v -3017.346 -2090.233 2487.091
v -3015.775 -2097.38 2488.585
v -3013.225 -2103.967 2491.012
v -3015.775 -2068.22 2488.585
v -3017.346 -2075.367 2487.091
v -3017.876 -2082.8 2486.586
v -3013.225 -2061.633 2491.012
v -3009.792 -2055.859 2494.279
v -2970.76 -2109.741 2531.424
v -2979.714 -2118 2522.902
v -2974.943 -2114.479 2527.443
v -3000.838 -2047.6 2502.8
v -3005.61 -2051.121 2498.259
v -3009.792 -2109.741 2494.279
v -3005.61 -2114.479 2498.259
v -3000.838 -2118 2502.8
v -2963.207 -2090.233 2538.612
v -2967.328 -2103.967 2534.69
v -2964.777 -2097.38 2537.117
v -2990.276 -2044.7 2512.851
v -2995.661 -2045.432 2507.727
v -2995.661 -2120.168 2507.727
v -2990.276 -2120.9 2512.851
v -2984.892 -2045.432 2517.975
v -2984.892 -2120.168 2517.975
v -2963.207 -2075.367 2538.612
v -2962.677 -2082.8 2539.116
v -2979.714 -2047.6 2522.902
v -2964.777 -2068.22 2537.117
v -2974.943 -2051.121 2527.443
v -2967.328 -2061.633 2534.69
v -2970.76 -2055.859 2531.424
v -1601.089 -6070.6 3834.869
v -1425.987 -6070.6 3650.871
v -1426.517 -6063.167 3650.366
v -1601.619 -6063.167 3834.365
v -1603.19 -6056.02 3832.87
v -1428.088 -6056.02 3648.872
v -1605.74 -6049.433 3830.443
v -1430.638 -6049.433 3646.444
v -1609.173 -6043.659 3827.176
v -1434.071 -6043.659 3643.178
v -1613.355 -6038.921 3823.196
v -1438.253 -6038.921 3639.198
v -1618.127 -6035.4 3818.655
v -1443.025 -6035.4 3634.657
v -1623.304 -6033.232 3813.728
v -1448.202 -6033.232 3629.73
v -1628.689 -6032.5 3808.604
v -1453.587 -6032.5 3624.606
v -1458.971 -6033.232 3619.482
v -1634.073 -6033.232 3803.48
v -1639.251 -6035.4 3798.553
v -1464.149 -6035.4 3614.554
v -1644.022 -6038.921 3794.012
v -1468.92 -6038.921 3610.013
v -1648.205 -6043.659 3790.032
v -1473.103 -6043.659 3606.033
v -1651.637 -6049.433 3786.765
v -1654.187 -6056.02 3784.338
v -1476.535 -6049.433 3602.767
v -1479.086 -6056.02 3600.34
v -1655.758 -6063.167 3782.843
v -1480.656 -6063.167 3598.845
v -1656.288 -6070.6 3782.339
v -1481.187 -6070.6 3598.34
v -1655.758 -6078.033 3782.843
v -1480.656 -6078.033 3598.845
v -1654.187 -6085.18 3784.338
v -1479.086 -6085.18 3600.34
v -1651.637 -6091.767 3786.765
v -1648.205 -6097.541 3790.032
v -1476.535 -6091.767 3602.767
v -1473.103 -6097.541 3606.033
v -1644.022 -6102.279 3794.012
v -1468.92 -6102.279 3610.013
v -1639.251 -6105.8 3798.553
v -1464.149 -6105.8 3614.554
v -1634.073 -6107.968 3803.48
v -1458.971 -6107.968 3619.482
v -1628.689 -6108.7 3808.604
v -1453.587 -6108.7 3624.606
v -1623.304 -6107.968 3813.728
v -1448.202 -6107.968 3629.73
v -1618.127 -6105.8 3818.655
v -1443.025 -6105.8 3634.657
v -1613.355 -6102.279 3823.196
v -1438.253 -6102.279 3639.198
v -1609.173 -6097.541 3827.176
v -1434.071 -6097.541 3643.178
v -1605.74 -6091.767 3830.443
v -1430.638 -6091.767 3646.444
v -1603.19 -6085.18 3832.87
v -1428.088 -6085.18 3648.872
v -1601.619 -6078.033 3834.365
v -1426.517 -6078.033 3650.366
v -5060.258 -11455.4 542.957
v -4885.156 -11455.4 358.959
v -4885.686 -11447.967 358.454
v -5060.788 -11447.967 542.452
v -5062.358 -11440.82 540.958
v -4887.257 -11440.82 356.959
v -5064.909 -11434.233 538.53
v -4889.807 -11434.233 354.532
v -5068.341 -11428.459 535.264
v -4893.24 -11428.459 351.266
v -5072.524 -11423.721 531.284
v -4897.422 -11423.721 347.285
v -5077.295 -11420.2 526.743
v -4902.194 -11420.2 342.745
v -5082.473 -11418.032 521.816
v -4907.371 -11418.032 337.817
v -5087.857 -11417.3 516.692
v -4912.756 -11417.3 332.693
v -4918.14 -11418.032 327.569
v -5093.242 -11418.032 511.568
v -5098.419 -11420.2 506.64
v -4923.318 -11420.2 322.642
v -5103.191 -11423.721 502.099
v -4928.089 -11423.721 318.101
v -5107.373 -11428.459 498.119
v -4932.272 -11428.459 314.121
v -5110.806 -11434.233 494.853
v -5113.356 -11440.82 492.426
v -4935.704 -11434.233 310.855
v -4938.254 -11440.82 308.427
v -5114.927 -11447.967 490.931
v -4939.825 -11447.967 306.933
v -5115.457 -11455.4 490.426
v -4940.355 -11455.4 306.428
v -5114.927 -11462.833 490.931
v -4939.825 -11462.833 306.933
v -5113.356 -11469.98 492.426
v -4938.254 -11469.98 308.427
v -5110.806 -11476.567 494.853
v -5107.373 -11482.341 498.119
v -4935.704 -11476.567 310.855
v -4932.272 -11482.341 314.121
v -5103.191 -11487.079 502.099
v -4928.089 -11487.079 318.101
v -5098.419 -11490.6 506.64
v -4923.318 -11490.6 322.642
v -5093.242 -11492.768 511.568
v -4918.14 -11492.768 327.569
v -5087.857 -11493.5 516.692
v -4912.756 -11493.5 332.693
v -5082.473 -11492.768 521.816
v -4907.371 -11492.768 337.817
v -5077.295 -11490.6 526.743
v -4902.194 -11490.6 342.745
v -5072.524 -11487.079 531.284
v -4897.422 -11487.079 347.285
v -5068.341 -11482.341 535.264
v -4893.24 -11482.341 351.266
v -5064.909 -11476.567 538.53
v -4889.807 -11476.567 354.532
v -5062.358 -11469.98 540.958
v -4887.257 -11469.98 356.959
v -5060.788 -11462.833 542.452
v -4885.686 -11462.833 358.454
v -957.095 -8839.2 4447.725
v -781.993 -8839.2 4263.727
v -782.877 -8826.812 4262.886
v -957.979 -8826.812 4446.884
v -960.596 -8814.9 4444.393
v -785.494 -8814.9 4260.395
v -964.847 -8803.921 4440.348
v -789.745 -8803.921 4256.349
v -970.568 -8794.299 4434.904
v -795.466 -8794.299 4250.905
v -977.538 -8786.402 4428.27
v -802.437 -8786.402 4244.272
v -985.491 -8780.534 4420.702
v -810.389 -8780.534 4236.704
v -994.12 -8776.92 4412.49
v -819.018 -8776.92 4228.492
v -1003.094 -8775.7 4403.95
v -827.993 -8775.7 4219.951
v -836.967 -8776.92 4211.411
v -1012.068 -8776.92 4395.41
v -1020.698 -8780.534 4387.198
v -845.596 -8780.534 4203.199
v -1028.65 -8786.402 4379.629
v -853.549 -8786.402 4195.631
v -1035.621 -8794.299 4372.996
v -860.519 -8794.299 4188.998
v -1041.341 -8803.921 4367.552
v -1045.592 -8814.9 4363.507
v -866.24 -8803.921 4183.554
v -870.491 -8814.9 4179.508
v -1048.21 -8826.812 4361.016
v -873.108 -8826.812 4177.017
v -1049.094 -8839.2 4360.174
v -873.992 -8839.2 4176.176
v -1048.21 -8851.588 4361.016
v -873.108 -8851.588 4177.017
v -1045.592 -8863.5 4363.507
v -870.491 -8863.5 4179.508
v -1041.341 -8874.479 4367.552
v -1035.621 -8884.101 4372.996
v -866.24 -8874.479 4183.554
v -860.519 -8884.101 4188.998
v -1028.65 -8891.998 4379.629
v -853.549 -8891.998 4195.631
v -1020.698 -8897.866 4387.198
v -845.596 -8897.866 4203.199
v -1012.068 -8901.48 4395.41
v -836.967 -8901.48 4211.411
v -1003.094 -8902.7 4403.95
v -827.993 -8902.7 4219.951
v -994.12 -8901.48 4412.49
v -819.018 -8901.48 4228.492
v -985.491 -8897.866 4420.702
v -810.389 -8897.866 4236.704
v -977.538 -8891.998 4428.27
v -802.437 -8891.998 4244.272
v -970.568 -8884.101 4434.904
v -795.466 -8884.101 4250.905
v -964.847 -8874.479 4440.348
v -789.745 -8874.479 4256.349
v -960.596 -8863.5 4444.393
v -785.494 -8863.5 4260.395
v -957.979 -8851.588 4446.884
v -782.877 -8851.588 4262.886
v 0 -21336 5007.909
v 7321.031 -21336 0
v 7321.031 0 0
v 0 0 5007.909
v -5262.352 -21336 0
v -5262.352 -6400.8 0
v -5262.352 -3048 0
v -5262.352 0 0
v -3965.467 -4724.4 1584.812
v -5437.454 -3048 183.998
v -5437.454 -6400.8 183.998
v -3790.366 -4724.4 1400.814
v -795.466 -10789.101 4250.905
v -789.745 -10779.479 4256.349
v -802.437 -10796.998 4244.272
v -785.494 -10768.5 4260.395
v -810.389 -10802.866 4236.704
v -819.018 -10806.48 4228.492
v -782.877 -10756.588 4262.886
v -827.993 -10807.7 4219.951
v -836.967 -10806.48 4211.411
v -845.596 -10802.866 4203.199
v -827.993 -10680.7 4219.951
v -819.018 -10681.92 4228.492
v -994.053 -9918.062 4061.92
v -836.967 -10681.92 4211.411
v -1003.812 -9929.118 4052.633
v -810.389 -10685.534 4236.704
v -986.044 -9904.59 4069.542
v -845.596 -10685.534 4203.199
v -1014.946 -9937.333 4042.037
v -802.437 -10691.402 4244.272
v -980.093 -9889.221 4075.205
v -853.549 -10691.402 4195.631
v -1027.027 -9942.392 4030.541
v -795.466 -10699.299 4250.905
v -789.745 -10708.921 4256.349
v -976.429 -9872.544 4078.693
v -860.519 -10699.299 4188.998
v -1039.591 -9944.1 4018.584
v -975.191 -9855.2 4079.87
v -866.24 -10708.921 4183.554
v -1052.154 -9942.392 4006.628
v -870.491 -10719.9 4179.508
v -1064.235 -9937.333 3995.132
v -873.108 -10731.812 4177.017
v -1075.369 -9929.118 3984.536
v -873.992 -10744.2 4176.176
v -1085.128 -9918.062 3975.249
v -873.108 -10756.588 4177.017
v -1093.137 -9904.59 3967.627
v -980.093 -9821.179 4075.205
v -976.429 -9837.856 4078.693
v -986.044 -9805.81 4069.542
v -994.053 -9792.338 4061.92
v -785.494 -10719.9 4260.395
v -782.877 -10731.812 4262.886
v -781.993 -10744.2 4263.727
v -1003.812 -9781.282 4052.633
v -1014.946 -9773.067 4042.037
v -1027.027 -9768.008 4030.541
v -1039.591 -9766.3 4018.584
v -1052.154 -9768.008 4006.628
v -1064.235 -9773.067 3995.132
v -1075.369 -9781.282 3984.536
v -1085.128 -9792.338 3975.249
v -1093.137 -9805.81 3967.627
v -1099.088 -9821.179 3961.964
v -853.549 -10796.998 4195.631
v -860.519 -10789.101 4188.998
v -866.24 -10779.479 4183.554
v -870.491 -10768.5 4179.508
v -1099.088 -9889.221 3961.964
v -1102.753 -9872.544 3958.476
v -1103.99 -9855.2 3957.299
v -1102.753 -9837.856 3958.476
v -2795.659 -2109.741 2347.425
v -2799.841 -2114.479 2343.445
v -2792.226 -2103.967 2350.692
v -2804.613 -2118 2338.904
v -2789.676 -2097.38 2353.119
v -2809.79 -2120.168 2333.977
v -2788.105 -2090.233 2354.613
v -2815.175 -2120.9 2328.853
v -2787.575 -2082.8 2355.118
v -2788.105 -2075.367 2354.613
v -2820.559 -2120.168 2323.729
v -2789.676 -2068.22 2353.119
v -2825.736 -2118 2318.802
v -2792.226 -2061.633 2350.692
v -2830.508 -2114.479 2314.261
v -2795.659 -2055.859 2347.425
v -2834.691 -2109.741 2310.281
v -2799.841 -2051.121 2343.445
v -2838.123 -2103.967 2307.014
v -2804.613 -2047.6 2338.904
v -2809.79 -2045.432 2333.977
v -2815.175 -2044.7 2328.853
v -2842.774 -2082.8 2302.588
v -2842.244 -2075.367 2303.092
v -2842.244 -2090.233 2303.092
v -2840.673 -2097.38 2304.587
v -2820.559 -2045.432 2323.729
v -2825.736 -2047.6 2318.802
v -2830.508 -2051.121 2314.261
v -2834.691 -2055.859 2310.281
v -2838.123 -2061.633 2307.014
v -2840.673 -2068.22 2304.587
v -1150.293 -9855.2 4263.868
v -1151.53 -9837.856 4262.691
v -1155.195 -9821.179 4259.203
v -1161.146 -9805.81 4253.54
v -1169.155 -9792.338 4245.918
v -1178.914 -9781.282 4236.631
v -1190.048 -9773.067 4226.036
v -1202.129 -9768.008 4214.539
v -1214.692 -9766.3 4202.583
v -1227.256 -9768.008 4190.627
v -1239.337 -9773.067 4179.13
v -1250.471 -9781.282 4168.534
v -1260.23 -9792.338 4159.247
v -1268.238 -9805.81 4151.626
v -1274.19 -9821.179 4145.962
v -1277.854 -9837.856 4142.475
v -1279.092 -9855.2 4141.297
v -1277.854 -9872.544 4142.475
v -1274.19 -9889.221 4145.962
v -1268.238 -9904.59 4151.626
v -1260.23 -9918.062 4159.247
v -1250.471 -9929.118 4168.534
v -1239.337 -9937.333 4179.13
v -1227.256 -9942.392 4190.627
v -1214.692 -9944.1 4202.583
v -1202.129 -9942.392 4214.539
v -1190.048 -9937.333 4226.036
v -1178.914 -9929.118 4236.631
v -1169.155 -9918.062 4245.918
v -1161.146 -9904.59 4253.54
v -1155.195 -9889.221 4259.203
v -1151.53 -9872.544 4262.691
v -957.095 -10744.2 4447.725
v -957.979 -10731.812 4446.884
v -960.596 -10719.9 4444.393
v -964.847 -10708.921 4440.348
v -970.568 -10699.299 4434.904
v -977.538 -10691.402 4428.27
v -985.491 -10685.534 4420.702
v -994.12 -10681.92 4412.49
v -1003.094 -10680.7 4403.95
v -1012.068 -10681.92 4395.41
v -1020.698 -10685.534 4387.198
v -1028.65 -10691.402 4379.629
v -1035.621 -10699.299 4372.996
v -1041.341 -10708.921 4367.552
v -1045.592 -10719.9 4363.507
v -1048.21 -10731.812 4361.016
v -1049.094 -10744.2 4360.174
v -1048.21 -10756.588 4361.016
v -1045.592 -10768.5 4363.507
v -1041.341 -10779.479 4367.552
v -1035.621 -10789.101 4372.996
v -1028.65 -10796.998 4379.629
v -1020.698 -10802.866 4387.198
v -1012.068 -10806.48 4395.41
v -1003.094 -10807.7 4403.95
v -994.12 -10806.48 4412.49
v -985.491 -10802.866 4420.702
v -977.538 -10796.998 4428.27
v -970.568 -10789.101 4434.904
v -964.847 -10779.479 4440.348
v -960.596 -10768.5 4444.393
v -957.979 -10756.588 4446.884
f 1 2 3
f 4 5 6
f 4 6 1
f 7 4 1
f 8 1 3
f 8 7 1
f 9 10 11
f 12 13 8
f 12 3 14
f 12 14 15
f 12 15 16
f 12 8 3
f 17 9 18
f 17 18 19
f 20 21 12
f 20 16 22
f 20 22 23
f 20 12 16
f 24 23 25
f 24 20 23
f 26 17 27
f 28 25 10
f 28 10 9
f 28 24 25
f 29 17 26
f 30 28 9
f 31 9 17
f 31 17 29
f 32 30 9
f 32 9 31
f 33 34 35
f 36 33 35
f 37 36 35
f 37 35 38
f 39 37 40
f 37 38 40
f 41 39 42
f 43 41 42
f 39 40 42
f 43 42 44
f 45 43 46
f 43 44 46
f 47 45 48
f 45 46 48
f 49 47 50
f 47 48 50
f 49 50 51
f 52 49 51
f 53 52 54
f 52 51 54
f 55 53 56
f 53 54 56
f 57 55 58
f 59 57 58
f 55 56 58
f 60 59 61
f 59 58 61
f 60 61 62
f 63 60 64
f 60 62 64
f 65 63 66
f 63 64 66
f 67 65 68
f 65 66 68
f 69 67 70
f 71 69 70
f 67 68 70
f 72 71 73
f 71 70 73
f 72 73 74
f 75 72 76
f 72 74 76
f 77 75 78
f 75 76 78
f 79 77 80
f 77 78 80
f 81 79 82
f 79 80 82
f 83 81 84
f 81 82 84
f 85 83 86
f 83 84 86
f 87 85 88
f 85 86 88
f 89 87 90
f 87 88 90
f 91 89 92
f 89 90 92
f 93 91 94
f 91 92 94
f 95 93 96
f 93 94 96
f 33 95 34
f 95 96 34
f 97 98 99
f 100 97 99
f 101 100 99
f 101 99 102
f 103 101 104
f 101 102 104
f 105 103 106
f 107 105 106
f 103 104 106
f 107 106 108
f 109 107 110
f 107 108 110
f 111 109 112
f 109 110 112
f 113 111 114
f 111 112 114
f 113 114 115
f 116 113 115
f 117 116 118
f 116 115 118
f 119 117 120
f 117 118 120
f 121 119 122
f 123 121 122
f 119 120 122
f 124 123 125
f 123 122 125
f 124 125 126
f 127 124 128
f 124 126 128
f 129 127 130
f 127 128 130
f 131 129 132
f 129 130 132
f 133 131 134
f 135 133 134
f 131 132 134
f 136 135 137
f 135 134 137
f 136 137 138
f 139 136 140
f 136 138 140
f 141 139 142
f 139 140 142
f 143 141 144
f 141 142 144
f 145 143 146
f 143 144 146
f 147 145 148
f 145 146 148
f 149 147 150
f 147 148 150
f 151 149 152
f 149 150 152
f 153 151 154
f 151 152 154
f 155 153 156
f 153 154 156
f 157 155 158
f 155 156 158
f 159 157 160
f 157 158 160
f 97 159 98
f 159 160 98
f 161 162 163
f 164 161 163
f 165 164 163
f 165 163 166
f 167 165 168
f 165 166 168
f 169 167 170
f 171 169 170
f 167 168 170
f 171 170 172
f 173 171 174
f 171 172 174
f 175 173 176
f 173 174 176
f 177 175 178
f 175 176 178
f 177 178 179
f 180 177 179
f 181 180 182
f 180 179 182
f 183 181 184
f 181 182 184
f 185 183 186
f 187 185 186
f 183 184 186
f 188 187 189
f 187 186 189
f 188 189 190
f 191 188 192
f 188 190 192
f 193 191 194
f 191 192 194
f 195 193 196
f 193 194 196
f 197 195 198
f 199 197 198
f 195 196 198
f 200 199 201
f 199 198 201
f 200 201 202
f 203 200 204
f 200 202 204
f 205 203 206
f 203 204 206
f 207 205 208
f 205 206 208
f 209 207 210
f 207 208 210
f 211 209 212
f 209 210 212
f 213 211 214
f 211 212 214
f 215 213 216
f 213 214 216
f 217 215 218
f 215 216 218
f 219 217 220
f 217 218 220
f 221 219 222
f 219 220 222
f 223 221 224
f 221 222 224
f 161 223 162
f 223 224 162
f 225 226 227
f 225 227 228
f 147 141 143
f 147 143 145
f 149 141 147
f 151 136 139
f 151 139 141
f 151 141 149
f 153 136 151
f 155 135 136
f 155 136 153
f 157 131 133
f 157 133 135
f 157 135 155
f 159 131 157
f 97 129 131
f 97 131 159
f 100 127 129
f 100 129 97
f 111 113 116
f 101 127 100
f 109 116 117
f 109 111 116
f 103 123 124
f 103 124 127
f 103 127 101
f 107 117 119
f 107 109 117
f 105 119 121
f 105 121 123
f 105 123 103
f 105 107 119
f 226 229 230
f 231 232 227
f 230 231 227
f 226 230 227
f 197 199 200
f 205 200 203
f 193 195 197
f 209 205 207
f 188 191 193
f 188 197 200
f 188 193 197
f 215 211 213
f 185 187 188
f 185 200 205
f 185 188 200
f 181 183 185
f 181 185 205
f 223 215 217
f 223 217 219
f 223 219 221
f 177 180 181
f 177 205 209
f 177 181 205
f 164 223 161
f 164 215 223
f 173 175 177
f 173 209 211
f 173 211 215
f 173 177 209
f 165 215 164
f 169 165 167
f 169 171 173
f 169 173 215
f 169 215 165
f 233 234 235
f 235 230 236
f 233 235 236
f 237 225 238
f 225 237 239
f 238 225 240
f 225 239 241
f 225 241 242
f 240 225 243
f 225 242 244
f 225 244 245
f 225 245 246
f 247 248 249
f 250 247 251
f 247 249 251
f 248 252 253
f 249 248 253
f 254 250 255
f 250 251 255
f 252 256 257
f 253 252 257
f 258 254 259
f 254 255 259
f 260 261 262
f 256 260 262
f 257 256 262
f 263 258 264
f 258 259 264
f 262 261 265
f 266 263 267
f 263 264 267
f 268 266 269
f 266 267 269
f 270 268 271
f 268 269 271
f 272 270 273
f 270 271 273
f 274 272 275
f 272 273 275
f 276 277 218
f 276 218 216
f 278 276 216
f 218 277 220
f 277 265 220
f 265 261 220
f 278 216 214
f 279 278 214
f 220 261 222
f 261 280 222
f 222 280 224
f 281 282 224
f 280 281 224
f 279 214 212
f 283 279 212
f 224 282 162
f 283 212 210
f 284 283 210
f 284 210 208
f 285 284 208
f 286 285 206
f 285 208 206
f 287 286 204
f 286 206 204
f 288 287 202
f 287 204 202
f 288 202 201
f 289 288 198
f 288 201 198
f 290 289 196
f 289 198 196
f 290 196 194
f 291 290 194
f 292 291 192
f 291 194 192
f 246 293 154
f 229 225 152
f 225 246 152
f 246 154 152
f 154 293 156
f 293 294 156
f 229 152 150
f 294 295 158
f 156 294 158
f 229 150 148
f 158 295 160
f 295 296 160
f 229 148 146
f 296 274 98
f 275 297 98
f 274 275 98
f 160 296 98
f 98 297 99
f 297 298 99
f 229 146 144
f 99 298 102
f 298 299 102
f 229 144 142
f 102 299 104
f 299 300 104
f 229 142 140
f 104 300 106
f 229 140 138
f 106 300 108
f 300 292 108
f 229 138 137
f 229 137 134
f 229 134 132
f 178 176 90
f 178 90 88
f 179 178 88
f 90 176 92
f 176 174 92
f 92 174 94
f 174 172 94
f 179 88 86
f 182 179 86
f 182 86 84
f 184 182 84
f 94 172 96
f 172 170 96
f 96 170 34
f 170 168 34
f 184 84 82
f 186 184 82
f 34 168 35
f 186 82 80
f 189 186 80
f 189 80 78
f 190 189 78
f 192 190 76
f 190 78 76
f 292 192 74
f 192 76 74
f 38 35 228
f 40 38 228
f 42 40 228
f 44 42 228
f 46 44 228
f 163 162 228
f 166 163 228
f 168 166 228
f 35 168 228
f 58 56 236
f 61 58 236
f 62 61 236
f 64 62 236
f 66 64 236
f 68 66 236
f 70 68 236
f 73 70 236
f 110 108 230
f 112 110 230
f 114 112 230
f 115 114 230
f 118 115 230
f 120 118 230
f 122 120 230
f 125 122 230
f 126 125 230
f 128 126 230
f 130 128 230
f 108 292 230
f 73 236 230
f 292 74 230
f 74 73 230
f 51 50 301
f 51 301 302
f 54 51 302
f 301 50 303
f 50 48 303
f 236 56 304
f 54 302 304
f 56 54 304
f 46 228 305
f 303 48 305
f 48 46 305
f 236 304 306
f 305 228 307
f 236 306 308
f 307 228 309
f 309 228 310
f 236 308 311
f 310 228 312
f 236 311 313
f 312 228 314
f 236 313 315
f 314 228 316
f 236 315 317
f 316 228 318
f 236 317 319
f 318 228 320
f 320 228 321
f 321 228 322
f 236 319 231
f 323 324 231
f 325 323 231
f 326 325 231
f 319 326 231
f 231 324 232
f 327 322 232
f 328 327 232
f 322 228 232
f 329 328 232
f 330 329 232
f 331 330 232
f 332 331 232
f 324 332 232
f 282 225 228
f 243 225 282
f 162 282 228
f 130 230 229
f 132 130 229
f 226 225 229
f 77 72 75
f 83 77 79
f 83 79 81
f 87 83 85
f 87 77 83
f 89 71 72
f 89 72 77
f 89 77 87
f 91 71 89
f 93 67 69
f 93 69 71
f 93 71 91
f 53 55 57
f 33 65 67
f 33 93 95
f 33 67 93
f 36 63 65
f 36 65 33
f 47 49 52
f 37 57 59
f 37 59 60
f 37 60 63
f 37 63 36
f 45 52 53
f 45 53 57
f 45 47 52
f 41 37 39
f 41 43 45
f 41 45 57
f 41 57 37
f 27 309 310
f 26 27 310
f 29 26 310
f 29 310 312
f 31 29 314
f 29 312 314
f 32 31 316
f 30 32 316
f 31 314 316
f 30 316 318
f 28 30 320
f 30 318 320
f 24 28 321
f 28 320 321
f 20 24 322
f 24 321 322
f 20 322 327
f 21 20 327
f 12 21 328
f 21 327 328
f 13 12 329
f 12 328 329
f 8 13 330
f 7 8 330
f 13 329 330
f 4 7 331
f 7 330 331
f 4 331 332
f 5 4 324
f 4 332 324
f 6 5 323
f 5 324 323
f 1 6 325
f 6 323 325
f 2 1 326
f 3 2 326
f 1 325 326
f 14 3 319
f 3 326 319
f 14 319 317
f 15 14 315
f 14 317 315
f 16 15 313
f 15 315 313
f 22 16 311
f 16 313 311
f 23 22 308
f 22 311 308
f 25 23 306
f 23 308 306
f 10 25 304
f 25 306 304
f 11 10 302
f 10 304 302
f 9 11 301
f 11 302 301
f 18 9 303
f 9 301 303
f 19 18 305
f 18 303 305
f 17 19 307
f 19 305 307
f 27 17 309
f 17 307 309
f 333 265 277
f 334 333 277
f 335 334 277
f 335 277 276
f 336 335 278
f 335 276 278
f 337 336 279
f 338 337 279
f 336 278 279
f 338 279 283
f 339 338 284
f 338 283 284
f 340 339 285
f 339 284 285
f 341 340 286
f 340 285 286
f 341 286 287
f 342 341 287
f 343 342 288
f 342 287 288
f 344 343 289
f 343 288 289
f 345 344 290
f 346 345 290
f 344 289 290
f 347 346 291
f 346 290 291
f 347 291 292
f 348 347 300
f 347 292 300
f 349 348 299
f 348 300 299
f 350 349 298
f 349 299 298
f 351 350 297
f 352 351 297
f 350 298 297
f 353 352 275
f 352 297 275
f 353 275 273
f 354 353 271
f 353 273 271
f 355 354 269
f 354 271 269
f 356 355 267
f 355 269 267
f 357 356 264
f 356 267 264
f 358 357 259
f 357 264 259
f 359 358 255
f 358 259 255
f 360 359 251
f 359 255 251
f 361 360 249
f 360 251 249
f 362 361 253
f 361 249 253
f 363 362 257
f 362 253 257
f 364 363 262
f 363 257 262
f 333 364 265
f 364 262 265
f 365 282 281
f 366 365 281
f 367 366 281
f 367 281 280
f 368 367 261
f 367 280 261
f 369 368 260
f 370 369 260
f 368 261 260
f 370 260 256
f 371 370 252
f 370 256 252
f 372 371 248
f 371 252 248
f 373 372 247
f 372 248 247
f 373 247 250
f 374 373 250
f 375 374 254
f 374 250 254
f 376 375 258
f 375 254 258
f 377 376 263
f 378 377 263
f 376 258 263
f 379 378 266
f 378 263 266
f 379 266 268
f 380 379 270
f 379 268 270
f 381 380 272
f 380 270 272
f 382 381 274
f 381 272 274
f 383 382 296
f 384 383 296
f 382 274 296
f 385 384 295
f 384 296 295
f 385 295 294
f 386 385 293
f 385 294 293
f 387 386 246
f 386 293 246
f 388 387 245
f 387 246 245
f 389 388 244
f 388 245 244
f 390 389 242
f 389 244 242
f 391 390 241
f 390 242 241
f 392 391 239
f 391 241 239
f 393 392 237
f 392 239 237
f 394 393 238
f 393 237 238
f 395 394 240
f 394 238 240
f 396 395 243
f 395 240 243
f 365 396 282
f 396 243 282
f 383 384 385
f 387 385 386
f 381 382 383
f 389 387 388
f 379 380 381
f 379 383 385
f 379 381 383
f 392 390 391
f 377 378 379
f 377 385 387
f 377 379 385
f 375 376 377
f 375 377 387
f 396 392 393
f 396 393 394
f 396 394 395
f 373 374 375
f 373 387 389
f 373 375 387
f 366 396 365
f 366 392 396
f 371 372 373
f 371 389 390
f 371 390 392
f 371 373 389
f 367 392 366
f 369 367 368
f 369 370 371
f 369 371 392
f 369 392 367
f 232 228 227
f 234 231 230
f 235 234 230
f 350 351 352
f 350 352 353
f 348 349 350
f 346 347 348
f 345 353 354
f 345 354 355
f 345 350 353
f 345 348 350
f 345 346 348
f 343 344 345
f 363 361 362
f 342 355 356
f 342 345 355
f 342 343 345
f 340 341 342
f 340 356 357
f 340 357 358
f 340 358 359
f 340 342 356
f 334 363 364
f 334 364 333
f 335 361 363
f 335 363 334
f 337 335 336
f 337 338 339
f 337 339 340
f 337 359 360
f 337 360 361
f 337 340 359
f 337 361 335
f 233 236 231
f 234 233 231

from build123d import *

# Parameters (mm, degrees)
F1_DEPTH  = 21336
F2_R      = 38.1
F3_DEPTH  = 254
F4_R      = 38.1
F5_DEPTH  = 254
F6_R      = 38.1
F7_DEPTH  = 254
F8_R      = 63.5
F9_DEPTH  = 254
F10_R     = 63.5
F11_DEPTH = 254
F12_R     = 88.9
F13_DEPTH = 254
F15_DEPTH = 254


with BuildPart() as f1:
    # F0 (on Front) → F1 (new body)
    with BuildSketch(Plane.XZ):
        Polygon((0, 5007.909211275), (-5262.3523914336, 0), (7321.0311030403, 0), align=None)
    extrude(amount=F1_DEPTH)

    # F2 (on face) → F3 (join)
    with BuildSketch(Plane(origin=(-2500.8826949727, 0, 2627.9482065997), x_dir=(0.7244028951, 0, 0.689376853), z_dir=(-0.689376853, 0, 0.7244028951))):
        with Locations((-433.8633075859, -2082.8)):
            Circle(F2_R)
    extrude(amount=F3_DEPTH)

    # F4 (on face) → F5 (join)
    with BuildSketch(Plane(origin=(-2500.8826949727, 0, 2627.9482065997), x_dir=(0.7244028951, 0, 0.689376853), z_dir=(-0.689376853, 0, 0.7244028951))):
        with Locations((-3329.4633075859, -11455.4)):
            Circle(F4_R)
    extrude(amount=F5_DEPTH)

    # F6 (on face) → F7 (join)
    with BuildSketch(Plane(origin=(-2500.8826949727, 0, 2627.9482065997), x_dir=(0.7244028951, 0, 0.689376853), z_dir=(-0.689376853, 0, 0.7244028951))):
        with Locations((1445.7366924141, -6070.6)):
            Circle(F6_R)
    extrude(amount=F7_DEPTH)

    # F8 (on face) → F9 (join)
    with BuildSketch(Plane(origin=(-2500.8826949727, 0, 2627.9482065997), x_dir=(0.7244028951, 0, 0.689376853), z_dir=(-0.689376853, 0, 0.7244028951))):
        with Locations((2309.3366924141, -8839.2)):
            Circle(F8_R)
    extrude(amount=F9_DEPTH)

    # F10 (on face) → F11 (join)
    with BuildSketch(Plane(origin=(-2500.8826949727, 0, 2627.9482065997), x_dir=(0.7244028951, 0, 0.689376853), z_dir=(-0.689376853, 0, 0.7244028951))):
        with Locations((2309.3366924141, -10744.2)):
            Circle(F10_R)
    extrude(amount=F11_DEPTH)

    # F12 (on face) → F13 (join)
    with BuildSketch(Plane(origin=(-2500.8826949727, 0, 2627.9482065997), x_dir=(0.7244028951, 0, 0.689376853), z_dir=(-0.689376853, 0, 0.7244028951))):
        with Locations((2017.2366924141, -9855.2)):
            Circle(F12_R)
    extrude(amount=F13_DEPTH)

    # F14 (on face) → F15 (join)
    with BuildSketch(Plane(origin=(-2500.8826949727, 0, 2627.9482065997), x_dir=(0.7244028951, 0, 0.689376853), z_dir=(-0.689376853, 0, 0.7244028951))):
        Polygon((-1780.0633075859, -4724.4), (-3812.0633075859, -3048), (-3812.0633075859, -6400.8), align=None)
    extrude(amount=F15_DEPTH)


solid = f1.part
